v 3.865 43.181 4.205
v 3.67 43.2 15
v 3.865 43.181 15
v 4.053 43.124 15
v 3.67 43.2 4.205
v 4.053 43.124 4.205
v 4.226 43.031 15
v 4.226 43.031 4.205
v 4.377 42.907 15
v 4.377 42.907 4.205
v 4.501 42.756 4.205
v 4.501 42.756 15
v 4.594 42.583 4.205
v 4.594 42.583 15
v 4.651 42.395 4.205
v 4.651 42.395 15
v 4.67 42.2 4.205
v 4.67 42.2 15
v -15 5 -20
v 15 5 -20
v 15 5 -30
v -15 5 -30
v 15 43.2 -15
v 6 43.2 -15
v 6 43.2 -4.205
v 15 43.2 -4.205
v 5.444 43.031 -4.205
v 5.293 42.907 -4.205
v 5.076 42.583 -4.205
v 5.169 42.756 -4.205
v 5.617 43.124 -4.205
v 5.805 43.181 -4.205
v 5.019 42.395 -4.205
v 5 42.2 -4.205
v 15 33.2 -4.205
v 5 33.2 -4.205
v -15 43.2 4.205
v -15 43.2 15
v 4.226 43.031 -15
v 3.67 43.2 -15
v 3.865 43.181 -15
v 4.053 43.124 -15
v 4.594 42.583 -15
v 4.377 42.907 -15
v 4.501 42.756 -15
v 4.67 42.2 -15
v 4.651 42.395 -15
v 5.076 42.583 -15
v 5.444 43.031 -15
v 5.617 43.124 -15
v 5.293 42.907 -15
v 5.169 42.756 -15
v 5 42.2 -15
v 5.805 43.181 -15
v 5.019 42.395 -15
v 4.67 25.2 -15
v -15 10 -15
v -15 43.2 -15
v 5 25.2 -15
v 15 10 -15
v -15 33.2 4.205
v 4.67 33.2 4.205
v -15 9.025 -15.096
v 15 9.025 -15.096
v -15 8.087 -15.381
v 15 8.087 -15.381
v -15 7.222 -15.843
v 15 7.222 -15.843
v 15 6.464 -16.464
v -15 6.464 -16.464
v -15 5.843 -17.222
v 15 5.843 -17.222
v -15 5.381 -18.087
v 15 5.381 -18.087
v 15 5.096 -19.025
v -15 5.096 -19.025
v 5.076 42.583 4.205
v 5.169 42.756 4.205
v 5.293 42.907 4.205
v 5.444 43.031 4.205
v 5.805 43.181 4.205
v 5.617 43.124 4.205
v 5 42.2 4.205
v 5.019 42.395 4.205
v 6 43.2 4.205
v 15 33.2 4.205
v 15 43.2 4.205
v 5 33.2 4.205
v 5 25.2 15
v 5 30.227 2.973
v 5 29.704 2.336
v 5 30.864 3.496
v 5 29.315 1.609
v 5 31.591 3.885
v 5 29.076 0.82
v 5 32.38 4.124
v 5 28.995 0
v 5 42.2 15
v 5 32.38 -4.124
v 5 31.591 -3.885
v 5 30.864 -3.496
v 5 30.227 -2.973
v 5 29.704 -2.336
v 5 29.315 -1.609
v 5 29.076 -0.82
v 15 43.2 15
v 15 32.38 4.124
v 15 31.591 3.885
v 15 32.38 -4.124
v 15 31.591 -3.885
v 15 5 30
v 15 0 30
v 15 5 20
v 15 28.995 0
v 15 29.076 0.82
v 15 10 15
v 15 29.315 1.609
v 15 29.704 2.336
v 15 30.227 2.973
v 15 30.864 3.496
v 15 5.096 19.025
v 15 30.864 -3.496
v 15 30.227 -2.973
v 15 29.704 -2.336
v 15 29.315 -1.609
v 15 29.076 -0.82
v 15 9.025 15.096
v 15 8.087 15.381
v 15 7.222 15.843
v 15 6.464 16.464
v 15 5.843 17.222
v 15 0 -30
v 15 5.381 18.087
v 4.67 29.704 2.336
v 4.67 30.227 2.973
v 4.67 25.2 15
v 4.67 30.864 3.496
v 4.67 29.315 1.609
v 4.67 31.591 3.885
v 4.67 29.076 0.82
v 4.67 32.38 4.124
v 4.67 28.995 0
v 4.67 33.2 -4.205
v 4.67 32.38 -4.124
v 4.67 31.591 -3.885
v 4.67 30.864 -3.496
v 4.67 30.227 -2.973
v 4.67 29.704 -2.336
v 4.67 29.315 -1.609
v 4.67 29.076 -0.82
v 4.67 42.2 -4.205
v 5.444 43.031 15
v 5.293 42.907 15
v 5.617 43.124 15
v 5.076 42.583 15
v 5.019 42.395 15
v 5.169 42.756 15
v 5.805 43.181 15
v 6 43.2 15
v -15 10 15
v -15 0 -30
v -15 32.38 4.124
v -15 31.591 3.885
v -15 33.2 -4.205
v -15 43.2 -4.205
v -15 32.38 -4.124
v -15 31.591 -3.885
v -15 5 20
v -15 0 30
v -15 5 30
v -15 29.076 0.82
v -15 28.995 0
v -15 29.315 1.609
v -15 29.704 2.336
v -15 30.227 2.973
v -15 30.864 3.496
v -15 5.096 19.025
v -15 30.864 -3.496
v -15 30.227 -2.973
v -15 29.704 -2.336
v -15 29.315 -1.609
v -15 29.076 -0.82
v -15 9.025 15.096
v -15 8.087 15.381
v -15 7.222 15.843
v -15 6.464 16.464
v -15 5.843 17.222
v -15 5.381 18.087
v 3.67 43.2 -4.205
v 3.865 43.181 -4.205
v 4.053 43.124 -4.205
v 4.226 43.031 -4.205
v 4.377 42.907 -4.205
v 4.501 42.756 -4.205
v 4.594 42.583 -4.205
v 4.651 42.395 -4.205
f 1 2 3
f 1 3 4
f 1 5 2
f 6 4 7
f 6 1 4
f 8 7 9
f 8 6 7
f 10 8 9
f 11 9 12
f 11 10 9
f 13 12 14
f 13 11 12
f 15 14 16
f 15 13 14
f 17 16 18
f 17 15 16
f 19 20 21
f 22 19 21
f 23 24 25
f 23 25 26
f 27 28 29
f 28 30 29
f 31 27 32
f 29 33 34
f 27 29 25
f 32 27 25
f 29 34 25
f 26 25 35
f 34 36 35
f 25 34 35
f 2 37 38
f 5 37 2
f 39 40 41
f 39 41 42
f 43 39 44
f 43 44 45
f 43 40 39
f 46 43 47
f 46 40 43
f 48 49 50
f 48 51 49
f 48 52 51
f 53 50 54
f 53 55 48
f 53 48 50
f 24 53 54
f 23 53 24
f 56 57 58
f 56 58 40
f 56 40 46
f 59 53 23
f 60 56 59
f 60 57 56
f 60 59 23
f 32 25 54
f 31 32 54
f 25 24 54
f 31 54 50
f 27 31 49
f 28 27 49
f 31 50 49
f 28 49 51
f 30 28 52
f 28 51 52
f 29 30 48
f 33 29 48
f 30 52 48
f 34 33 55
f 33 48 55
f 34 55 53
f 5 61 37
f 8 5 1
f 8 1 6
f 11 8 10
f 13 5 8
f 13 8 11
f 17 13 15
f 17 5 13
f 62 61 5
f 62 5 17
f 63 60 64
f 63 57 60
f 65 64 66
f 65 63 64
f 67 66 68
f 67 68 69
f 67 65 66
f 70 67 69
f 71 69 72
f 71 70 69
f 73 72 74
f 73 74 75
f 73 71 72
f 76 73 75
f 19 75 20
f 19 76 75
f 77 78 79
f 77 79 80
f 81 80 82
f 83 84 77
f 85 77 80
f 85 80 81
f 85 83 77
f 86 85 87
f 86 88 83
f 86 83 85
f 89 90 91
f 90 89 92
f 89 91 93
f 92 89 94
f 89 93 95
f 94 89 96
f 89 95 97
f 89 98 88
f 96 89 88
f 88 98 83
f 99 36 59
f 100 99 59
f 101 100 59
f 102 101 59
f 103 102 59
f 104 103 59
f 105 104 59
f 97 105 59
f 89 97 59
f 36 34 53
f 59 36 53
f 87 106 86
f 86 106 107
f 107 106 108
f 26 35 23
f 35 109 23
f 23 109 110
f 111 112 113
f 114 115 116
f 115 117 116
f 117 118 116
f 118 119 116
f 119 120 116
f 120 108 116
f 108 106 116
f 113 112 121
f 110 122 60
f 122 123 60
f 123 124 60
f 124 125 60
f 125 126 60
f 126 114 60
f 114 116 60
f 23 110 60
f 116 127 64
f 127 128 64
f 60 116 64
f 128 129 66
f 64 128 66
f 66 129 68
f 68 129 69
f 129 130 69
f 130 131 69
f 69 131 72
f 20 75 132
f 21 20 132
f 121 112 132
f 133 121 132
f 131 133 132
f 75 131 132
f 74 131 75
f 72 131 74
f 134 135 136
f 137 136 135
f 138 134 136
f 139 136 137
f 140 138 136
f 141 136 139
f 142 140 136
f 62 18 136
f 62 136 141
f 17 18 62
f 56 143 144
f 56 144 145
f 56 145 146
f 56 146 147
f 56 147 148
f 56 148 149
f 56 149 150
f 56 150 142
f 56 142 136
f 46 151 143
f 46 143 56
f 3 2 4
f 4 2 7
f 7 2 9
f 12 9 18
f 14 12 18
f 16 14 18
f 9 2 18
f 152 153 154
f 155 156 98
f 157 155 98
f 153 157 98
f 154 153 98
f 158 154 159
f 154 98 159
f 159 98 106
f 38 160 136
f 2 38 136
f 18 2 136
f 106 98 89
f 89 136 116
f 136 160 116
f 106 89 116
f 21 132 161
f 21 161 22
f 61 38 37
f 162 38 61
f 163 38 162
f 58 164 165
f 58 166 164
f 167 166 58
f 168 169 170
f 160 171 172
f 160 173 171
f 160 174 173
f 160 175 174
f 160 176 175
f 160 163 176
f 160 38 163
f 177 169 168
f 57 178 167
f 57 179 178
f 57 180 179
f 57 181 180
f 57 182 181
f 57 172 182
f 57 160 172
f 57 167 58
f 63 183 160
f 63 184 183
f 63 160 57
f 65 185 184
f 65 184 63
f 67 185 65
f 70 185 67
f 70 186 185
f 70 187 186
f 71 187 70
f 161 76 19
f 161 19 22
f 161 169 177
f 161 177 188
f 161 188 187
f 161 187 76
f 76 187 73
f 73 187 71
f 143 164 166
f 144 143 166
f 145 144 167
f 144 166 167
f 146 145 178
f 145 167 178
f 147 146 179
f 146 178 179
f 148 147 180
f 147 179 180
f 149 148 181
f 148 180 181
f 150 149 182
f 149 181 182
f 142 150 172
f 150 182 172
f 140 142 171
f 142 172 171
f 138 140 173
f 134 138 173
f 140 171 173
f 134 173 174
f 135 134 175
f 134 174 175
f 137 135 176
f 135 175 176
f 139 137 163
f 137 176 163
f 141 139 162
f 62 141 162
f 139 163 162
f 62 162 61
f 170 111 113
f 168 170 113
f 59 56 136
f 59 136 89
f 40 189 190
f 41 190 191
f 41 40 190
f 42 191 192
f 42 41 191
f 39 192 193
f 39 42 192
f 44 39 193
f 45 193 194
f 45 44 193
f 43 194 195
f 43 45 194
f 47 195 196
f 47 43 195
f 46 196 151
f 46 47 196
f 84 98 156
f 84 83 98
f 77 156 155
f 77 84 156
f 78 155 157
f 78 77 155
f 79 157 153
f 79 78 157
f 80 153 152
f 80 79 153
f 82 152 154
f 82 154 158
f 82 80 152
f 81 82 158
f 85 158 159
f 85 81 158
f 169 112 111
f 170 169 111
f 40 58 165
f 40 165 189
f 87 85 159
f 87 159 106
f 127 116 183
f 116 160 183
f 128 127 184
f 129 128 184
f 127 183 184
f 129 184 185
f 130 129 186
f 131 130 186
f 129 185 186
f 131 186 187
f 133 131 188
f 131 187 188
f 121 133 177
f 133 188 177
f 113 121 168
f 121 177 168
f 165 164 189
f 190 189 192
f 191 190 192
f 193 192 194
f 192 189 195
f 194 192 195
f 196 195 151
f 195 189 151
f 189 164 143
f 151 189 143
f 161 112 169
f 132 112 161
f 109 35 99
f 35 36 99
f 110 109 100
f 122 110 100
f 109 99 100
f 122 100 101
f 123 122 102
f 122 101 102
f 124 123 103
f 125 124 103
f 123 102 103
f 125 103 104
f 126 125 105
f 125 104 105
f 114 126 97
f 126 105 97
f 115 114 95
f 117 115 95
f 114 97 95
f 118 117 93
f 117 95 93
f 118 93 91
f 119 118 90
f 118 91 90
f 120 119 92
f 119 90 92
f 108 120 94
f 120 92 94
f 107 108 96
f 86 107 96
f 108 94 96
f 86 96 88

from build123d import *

# Parameters (mm, degrees)
SKETCH1_W           = 30
SKETCH1_H           = 30
BOSS_EXTRUDE1_DEPTH = 33.2
SKETCH2_R           = 4.205
CUT_EXTRUDE1_DEPTH  = 48.19364364
SKETCH4_W           = 60
SKETCH4_H           = 5
BOSS_EXTRUDE2_DEPTH = 30
FILLET1_R           = 5
SKETCH5_W           = 30
SKETCH5_H           = 10.795
BOSS_EXTRUDE3_DEPTH = 10
SKETCH6_W           = 0.33
SKETCH6_H           = 30
CUT_EXTRUDE2_DEPTH  = 18
FILLET2_R           = 1


with BuildPart() as part:
    # Sketch1 → Boss-Extrude1 (new body)
    with BuildSketch(Plane(origin=(0, 0, 0), x_dir=(1, 0, 0), z_dir=(0, 1, 0))):
        Rectangle(SKETCH1_W, SKETCH1_H)
    extrude(amount=BOSS_EXTRUDE1_DEPTH)

    # Sketch2 → Cut-Extrude1 (cut, through all)
    with BuildSketch(Plane.ZY.offset(15)):
        with Locations((0, 33.2)):
            Circle(SKETCH2_R)
    extrude(amount=-CUT_EXTRUDE1_DEPTH, mode=Mode.SUBTRACT)

    # Sketch4 → Boss-Extrude2 (add)
    with BuildSketch(Plane(origin=(15, 0, 0), x_dir=(0, 0, -1), z_dir=(1, 0, 0))):
        with Locations((0, 2.5)):
            Rectangle(SKETCH4_W, SKETCH4_H)
    extrude(amount=-BOSS_EXTRUDE2_DEPTH)

    # Fillet1
    fillet1_edges = [part.edges().sort_by_distance(p)[0] for p in [
        (0, 5, -15),
        (0, 5, 15),
    ]]
    fillet(fillet1_edges, radius=FILLET1_R)

    # Sketch5 → Boss-Extrude3 (add)
    with BuildSketch(Plane(origin=(0, 33.2, 0), x_dir=(1, 0, 0), z_dir=(0, 1, 0))):
        with Locations((0, 9.6025)):
            Rectangle(SKETCH5_W, SKETCH5_H)
        with Locations((0, -9.6025)):
            Rectangle(SKETCH5_W, SKETCH5_H)
    extrude(amount=BOSS_EXTRUDE3_DEPTH)

    # Sketch6 → Cut-Extrude2 (cut)
    with BuildSketch(Plane(origin=(0, 43.2, 0), x_dir=(1, 0, 0), z_dir=(0, 1, 0))):
        with Locations((4.835, 0)):
            Rectangle(SKETCH6_W, SKETCH6_H)
    extrude(amount=-CUT_EXTRUDE2_DEPTH, mode=Mode.SUBTRACT)

    # Fillet2
    fillet2_edges = [part.edges().sort_by_distance(p)[0] for p in [
        (5, 43.2, -9.6025),
        (5, 43.2, 9.6025),
        (4.67, 43.2, 9.6025),
        (4.67, 43.2, -9.6025),
    ]]
    fillet(fillet2_edges, radius=FILLET2_R)


solid = part.part
